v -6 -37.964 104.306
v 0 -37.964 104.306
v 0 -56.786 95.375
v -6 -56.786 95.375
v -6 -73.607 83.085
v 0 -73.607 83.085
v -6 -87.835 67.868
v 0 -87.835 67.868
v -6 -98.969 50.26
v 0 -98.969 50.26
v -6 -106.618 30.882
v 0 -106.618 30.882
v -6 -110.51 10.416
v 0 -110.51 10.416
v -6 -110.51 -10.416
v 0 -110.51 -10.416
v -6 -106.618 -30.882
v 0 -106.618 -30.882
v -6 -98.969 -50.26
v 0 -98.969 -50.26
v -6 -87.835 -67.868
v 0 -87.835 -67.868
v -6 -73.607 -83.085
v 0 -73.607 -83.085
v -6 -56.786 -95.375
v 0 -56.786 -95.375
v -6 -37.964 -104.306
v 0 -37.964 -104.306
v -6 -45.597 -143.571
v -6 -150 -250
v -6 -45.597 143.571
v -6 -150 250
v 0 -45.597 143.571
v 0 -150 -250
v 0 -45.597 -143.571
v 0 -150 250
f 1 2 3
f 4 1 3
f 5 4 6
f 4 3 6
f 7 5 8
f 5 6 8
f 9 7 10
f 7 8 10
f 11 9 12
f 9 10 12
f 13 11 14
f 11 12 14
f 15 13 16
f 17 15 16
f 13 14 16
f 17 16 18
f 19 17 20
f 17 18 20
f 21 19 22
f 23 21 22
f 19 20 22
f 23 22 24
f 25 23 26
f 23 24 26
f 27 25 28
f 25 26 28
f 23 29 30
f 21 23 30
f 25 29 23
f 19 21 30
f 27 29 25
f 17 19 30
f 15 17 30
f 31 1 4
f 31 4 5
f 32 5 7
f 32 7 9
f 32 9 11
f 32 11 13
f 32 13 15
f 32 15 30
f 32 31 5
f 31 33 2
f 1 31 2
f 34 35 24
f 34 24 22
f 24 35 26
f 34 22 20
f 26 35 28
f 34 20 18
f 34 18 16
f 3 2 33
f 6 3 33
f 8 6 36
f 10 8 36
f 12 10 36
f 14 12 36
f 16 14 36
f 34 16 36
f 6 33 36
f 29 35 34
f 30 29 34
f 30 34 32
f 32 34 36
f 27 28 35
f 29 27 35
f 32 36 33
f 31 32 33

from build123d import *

# Parameters (mm, degrees)
SM_BASE_FLANGE_1_DEPTH = 6


# Sheet-metal steps are written as plain solids
with BuildPart() as part:
    # Sketch 1 → Базовая кромка1 (new body)
    with BuildSketch(Plane(origin=(0, 0, 0), x_dir=(0, 0, -1), z_dir=(1, 0, 0))):
        with BuildLine():
            Line((250, -150), (-250, -150))
            Line((-250, -150), (-143.570968245, -45.596595724))
            Line((-143.570968245, -45.596595724), (-104.305880907, -37.964235909))
            ThreePointArc((-104.305880907, -37.964235909), (0, -111), (104.305880907, -37.964235909))
            Line((104.305880907, -37.964235909), (143.570968245, -45.596595724))
            Line((143.570968245, -45.596595724), (250, -150))
        make_face()
    extrude(amount=-SM_BASE_FLANGE_1_DEPTH)


solid = part.part
